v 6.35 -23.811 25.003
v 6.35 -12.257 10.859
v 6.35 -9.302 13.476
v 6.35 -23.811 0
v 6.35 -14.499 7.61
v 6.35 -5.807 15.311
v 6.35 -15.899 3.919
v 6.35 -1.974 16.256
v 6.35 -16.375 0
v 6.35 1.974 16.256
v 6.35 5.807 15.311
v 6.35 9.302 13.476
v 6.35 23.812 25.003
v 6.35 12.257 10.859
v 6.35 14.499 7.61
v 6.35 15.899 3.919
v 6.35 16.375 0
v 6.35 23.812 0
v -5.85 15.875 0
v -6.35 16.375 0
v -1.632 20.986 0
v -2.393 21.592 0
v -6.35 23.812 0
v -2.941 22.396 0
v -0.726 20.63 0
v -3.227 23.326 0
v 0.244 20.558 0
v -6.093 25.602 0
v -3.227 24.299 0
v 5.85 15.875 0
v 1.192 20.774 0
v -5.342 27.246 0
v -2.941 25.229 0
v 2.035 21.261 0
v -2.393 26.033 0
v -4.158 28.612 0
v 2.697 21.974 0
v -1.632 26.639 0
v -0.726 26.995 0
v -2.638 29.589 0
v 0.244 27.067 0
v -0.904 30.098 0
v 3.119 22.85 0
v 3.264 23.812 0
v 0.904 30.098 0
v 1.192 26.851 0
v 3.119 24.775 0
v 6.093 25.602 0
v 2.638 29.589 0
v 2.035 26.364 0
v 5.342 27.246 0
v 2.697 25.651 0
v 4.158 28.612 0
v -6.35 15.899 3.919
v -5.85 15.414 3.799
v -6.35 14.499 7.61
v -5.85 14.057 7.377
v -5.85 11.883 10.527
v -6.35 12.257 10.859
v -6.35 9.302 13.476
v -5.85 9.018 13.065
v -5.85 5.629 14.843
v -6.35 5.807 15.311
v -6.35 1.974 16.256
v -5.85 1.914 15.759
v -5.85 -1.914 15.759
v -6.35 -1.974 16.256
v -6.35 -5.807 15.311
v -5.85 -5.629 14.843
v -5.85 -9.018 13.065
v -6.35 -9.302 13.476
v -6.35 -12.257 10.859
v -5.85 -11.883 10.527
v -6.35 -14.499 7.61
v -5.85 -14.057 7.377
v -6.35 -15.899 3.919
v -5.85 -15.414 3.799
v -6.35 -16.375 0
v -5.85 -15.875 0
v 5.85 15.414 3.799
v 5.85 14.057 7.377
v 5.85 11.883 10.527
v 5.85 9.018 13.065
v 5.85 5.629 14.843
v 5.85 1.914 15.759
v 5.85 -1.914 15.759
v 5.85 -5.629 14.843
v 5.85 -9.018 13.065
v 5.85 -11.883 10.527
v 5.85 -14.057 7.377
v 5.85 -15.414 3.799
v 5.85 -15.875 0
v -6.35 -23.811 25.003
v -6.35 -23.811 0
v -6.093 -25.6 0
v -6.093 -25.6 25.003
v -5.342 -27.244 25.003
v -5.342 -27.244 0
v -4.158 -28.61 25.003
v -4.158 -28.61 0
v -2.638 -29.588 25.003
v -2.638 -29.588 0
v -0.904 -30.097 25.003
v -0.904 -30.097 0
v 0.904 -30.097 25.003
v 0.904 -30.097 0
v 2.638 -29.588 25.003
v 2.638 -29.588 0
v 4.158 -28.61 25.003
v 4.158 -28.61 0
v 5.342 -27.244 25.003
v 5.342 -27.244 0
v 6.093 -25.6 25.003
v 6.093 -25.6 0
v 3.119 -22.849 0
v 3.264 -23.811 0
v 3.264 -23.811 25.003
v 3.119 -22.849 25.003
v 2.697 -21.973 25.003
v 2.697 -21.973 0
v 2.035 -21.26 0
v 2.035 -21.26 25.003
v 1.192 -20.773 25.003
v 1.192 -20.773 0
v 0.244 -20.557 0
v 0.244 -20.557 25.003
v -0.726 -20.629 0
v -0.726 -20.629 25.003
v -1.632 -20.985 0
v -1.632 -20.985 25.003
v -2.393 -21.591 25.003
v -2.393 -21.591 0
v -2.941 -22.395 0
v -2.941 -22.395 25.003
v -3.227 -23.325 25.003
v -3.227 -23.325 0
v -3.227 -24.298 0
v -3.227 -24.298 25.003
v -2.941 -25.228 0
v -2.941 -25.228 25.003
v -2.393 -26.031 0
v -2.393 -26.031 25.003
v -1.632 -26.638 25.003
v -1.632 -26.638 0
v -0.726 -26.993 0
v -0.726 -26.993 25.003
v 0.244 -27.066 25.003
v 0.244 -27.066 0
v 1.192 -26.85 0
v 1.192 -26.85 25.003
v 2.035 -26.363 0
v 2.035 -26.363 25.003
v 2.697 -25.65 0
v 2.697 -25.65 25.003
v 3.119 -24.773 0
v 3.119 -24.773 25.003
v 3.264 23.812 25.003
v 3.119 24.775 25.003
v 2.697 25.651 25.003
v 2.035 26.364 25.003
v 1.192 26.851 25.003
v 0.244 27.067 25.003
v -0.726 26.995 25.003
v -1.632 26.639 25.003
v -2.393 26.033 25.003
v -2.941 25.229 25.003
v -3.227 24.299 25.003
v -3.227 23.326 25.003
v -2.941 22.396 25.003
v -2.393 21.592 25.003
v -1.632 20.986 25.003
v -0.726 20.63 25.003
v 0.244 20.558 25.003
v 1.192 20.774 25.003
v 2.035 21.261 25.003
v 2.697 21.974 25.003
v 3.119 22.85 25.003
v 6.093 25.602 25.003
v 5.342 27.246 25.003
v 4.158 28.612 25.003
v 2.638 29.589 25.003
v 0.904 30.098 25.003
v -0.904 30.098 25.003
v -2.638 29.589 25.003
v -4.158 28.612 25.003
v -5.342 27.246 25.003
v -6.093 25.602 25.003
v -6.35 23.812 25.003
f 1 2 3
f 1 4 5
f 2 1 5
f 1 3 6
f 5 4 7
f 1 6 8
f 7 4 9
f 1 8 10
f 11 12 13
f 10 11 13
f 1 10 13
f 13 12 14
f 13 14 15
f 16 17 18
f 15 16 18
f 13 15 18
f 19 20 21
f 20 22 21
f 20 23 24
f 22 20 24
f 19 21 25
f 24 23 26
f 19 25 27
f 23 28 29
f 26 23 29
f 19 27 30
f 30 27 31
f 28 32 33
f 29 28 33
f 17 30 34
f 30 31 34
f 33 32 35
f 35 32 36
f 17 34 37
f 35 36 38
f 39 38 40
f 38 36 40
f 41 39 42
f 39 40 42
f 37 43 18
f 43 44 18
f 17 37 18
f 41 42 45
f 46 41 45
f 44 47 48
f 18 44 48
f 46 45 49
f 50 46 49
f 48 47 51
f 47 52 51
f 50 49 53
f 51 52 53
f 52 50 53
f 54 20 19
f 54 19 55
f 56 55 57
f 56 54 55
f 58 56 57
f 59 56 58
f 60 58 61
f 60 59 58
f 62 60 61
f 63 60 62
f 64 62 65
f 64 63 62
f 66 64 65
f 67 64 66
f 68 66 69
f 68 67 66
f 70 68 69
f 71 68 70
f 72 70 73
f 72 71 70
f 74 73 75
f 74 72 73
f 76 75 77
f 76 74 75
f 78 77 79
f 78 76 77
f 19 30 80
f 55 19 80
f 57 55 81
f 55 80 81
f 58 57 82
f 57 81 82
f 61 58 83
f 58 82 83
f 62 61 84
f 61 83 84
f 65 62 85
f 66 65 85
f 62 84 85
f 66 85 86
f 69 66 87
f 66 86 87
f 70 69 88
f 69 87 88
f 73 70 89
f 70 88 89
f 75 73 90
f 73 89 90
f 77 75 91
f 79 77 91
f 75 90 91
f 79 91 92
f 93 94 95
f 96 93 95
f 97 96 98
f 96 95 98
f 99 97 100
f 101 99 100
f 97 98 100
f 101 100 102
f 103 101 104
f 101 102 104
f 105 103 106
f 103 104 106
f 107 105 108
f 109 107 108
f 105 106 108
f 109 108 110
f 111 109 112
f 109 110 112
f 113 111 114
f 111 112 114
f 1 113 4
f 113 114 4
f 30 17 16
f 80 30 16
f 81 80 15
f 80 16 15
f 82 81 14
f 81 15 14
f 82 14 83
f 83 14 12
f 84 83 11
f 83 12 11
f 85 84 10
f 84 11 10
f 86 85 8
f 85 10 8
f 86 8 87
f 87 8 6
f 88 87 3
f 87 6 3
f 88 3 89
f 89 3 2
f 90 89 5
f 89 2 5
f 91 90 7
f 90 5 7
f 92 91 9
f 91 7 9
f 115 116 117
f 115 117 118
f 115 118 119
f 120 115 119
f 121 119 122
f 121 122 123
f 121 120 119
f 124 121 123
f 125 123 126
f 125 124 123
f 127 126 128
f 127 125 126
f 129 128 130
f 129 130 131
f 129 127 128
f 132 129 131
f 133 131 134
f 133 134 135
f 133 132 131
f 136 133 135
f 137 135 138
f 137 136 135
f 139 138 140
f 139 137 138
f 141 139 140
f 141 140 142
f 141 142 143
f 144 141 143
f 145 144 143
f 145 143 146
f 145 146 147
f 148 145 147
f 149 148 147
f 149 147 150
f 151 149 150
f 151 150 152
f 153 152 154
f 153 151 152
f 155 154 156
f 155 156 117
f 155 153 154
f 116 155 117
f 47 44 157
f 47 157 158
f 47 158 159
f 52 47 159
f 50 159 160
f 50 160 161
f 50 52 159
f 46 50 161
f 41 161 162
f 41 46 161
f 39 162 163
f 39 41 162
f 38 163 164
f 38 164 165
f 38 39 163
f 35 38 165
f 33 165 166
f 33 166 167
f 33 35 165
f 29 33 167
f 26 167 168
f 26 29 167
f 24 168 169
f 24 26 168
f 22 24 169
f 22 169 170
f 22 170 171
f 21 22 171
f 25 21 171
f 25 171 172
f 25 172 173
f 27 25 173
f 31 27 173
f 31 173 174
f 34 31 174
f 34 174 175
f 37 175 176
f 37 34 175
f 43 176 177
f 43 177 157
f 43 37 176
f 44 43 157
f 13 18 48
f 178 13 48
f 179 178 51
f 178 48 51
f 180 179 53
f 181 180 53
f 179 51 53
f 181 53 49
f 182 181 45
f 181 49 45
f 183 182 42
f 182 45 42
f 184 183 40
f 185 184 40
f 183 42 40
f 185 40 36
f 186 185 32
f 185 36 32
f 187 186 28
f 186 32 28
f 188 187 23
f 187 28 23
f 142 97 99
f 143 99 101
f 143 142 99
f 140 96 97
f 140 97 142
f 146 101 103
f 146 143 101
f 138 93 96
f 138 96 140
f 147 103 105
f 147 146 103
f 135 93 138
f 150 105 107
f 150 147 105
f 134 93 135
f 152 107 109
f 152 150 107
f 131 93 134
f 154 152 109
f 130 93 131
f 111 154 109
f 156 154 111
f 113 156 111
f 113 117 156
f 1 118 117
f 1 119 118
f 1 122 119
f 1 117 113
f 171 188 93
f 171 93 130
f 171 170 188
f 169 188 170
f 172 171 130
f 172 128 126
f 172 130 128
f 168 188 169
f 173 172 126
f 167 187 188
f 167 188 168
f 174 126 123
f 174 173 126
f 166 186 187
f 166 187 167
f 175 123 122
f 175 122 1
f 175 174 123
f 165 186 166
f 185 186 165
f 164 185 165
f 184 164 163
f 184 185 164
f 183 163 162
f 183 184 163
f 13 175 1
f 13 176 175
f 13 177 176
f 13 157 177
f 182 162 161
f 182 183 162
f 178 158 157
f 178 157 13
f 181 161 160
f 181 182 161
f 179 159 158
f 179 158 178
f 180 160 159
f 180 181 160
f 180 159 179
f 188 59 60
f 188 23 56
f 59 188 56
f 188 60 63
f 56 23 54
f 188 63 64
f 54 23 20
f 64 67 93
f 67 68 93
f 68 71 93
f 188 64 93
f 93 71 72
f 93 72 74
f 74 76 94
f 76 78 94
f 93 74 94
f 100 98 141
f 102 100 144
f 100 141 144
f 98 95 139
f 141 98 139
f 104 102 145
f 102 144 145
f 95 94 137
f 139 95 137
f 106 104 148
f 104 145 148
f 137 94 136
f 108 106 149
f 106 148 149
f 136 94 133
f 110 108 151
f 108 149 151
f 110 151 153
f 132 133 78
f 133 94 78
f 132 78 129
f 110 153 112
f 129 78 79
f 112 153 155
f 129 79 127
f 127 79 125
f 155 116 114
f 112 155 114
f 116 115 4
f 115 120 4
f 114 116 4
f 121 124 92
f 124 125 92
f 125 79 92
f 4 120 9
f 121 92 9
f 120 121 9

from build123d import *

# Parameters (mm, degrees)
SKETCH2_R           = 3.2639
BOSS_EXTRUDE1_DEPTH = 25.0031
SKETCH3_R           = 15.875
CUT_EXTRUDE1_DEPTH  = 13.7
CHAMFER1_SIZE       = 0.5
CHAMFER2_SIZE       = 0.5


with BuildPart() as part:
    # Sketch2 → Boss-Extrude1 (new body)
    with BuildSketch(Plane.XY):
        with BuildLine():
            Line((-6.35, 23.8125), (-6.35, -23.8114))
            ThreePointArc((-6.35, -23.8114), (0, -30.1614), (6.35, -23.8114))
            Line((6.35, -23.8114), (6.35, 23.8125))
            ThreePointArc((6.35, 23.8125), (0, 30.1625), (-6.35, 23.8125))
        make_face()
        with Locations((0, -23.8114)):
            Circle(SKETCH2_R, mode=Mode.SUBTRACT)
        with Locations((0, 23.8125)):
            Circle(SKETCH2_R, mode=Mode.SUBTRACT)
    extrude(amount=BOSS_EXTRUDE1_DEPTH)

    # Sketch3 → Cut-Extrude1 (cut, through all)
    with BuildSketch(Plane(origin=(6.35, 0, 0), x_dir=(0, 0, -1), z_dir=(1, 0, 0))):
        Circle(SKETCH3_R)
    extrude(amount=-CUT_EXTRUDE1_DEPTH, mode=Mode.SUBTRACT)

    # Chamfer1
    chamfer1_edges = [part.edges().sort_by_distance(p)[0] for p in [
        (6.35, 0, 15.875),
    ]]
    chamfer(chamfer1_edges, length=CHAMFER1_SIZE)

    # Chamfer2
    chamfer2_edges = [part.edges().sort_by_distance(p)[0] for p in [
        (-6.35, 0, 15.875),
    ]]
    chamfer(chamfer2_edges, length=CHAMFER2_SIZE)


solid = part.part
